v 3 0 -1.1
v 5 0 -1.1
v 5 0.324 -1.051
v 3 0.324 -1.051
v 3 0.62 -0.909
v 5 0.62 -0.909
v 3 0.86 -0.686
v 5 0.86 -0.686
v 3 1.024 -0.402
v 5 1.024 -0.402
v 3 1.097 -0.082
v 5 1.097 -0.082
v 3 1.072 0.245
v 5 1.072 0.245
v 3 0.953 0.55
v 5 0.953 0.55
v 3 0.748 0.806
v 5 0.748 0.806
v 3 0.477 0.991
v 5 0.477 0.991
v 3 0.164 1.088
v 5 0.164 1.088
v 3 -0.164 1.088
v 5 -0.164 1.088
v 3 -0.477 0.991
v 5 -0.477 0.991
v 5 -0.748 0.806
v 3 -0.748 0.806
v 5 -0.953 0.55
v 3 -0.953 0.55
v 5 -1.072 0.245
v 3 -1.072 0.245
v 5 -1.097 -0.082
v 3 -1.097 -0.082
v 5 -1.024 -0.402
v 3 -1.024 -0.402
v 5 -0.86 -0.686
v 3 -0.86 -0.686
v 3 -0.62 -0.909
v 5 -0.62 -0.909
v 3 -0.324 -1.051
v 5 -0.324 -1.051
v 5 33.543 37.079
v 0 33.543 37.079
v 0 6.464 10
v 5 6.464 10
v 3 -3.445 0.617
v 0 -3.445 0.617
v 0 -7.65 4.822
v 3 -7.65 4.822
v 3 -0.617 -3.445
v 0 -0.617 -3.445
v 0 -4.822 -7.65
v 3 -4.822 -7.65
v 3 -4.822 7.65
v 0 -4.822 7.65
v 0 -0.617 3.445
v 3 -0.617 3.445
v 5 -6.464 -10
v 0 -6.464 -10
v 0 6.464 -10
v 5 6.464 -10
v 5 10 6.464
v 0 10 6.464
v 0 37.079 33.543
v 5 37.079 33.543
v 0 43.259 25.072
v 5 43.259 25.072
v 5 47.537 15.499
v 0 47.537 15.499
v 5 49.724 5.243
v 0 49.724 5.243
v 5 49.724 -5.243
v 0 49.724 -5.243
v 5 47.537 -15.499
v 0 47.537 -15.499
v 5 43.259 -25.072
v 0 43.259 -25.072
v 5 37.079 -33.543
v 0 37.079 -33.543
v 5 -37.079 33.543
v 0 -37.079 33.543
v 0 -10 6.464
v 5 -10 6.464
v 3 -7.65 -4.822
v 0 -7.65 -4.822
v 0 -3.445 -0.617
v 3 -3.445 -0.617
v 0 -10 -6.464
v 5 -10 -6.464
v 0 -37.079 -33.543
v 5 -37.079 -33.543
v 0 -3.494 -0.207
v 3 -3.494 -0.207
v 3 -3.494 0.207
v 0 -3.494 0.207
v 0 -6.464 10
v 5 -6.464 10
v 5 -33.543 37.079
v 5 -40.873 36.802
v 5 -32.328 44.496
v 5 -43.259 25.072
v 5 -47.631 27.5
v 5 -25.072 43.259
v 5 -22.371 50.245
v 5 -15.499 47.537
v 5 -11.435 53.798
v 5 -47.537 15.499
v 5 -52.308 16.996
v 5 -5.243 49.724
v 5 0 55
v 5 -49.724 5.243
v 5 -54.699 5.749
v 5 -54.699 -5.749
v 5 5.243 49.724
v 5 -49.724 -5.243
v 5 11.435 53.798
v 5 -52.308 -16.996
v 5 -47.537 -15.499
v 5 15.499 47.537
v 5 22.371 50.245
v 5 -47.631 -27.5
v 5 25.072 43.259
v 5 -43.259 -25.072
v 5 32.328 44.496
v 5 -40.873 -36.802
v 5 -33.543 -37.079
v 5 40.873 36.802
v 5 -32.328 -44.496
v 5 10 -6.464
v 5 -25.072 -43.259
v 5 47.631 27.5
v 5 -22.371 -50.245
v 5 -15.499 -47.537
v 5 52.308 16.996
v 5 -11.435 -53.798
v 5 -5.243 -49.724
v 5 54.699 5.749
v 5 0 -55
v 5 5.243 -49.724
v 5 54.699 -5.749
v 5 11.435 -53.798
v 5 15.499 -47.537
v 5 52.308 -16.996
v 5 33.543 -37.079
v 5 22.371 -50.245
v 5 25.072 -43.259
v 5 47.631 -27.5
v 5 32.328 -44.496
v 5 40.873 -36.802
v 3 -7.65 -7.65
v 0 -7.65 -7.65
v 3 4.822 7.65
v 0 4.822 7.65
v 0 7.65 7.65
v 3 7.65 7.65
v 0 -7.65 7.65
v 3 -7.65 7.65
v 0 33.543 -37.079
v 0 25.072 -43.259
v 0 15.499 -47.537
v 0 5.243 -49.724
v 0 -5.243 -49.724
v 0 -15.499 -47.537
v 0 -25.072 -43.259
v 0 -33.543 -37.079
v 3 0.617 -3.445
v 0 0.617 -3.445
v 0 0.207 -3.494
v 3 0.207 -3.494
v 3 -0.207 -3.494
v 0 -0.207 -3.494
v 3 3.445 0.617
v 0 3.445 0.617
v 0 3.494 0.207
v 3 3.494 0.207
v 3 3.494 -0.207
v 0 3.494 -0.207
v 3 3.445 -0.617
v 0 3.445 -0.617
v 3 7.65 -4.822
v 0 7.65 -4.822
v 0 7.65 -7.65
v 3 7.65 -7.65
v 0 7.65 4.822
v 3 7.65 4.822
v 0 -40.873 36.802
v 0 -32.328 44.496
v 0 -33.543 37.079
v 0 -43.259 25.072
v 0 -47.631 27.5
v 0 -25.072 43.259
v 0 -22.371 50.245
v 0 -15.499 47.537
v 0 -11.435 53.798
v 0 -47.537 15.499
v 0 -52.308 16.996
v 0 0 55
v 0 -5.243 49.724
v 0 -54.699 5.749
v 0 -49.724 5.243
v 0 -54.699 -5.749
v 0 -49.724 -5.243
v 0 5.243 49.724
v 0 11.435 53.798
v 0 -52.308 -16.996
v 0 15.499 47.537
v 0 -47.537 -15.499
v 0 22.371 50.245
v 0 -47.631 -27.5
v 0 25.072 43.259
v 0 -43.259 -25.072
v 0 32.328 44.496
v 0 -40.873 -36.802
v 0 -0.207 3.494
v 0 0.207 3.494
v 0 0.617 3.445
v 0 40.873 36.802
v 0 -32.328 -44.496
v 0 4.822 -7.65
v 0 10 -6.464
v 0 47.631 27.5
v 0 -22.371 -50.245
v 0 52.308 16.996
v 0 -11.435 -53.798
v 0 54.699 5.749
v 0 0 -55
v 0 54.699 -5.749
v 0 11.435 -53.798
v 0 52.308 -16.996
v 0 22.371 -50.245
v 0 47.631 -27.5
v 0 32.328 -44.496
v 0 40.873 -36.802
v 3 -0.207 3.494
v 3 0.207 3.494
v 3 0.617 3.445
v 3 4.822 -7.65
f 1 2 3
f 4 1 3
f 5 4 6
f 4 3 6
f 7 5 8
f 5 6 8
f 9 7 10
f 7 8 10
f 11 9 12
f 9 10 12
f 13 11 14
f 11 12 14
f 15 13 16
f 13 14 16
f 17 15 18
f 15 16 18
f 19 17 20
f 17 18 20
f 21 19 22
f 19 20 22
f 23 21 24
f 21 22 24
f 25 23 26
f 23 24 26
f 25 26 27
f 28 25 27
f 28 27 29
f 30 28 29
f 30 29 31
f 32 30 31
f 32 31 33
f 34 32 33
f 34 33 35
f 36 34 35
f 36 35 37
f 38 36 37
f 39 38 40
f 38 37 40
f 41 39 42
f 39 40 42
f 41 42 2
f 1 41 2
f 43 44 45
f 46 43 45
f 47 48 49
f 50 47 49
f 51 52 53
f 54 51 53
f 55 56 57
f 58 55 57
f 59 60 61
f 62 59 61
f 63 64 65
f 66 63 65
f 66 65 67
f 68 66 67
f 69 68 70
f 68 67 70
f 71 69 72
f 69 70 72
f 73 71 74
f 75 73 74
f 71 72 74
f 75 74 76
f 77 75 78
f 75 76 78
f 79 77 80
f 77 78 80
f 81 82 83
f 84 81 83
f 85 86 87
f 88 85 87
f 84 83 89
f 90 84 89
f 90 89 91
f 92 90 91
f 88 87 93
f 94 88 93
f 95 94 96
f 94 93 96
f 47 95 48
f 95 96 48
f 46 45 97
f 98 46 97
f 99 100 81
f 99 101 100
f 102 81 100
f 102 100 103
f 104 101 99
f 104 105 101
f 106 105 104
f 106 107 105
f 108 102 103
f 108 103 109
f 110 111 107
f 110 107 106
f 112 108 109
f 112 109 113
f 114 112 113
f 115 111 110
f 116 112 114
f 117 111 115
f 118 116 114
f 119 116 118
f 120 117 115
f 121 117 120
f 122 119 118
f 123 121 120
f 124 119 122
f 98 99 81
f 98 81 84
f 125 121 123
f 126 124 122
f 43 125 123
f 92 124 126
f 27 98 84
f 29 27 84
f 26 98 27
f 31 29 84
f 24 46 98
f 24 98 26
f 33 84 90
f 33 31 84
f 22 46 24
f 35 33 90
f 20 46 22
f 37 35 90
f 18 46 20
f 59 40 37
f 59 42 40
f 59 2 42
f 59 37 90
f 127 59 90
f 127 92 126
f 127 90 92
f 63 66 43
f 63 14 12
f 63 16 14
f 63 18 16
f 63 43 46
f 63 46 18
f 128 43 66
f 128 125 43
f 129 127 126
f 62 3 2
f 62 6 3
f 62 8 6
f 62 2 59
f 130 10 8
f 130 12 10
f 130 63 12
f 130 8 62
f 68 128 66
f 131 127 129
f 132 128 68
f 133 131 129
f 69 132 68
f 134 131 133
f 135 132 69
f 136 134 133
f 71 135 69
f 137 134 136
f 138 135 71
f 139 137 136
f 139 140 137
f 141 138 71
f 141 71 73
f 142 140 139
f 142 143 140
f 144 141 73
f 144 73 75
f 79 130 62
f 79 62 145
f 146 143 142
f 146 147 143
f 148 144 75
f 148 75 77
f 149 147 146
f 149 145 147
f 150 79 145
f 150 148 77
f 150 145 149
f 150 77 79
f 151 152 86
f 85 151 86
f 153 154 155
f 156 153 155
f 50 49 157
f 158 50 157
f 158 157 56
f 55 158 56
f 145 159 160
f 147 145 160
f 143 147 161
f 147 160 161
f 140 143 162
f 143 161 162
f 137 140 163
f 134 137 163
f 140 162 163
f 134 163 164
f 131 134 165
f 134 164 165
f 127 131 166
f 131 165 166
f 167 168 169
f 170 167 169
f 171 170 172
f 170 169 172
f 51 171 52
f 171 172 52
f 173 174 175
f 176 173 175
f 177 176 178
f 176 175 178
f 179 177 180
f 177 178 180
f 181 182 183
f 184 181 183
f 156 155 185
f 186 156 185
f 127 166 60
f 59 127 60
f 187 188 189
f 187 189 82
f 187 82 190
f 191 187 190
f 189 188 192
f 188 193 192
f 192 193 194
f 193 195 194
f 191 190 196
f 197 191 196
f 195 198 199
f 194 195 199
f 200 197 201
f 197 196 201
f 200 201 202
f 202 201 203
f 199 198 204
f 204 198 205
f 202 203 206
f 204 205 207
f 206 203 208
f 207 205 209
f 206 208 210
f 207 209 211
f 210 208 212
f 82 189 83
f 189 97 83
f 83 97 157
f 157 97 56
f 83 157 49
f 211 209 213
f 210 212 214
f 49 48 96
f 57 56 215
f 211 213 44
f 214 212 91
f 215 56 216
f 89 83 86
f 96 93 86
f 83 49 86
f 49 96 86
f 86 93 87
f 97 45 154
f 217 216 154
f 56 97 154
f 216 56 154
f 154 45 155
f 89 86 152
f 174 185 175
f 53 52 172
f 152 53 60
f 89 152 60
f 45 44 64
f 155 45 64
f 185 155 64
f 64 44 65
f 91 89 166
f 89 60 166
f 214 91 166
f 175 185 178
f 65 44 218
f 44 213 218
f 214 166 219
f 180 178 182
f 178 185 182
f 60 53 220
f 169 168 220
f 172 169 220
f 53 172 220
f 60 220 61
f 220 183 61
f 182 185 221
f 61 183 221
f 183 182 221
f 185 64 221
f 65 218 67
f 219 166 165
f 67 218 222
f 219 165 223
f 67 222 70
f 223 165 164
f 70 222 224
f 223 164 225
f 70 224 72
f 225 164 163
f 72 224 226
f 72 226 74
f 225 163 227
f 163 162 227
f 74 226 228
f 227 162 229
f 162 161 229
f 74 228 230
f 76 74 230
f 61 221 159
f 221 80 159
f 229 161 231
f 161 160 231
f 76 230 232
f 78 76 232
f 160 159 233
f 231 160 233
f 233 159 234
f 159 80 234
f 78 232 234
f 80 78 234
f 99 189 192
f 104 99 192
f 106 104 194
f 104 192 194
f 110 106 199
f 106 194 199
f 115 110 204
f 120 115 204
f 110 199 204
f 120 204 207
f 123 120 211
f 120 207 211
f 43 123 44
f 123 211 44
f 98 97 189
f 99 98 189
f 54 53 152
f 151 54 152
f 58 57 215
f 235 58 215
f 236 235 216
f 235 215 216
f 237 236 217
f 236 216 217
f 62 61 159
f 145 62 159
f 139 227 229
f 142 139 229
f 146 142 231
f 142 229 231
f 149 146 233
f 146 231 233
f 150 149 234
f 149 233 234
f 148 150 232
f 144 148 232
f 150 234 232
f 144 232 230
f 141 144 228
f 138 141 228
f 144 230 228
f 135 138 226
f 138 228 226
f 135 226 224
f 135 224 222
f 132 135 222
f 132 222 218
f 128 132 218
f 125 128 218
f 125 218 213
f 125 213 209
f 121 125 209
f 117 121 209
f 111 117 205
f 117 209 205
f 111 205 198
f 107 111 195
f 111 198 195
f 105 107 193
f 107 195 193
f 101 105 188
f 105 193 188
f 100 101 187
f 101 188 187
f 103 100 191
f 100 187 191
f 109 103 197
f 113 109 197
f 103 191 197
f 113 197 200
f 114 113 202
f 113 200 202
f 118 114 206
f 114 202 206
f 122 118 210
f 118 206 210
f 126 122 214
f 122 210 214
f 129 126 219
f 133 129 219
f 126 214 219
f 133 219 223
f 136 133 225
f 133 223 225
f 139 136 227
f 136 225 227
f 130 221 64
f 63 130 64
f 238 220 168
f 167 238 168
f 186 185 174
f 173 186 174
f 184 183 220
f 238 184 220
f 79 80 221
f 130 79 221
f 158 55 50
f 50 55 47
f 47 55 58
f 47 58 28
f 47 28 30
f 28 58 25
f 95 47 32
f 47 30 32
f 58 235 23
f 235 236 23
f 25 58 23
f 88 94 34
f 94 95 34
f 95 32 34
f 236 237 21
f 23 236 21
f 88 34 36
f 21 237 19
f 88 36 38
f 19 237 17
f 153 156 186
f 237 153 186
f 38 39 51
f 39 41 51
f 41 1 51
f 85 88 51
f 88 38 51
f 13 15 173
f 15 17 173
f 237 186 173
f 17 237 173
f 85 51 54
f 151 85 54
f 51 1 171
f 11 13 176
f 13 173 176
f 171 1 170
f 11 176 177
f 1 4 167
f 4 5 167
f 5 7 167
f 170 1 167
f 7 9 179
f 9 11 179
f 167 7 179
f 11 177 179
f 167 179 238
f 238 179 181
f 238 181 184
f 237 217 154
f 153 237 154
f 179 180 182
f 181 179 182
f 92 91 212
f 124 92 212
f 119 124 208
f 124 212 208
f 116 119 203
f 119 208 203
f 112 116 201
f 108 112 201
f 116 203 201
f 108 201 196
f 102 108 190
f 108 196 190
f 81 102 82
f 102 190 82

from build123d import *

# Parameters (mm, degrees)
SKETCH1_R           = 55
BOSS_EXTRUDE1_DEPTH = 5
SKETCH2_W           = 15.3
SKETCH2_H           = 15.3
SKETCH2_R           = 1.1
BOSS_EXTRUDE2_DEPTH = 2


with BuildPart() as part:
    # Sketch1 → Boss-Extrude1 (new body)
    with BuildSketch(Plane(origin=(0, 0, 0), x_dir=(0, 0, -1), z_dir=(1, 0, 0))):
        Circle(SKETCH1_R)
        with BuildLine():
            Line((-33.543350277, -37.078884183), (-6.464466094, -10))
            Line((-6.464466094, -10), (6.464466094, -10))
            Line((6.464466094, -10), (33.543350277, -37.078884183))
            ThreePointArc((33.543350277, -37.078884183), (0, -50), (-33.543350277, -37.078884183))
        make_face(mode=Mode.SUBTRACT)
        with BuildLine():
            Line((10, -6.464466094), (10, 6.464466094))
            Line((10, 6.464466094), (37.078884183, 33.543350277))
            ThreePointArc((37.078884183, 33.543350277), (50, 0), (37.078884183, -33.543350277))
            Line((37.078884183, -33.543350277), (10, -6.464466094))
        make_face(mode=Mode.SUBTRACT)
        with BuildLine():
            Line((-37.078884183, 33.543350277), (-10, 6.464466094))
            Line((-10, 6.464466094), (-10, -6.464466094))
            Line((-10, -6.464466094), (-37.078884183, -33.543350277))
            ThreePointArc((-37.078884183, -33.543350277), (-50, 0), (-37.078884183, 33.543350277))
        make_face(mode=Mode.SUBTRACT)
        with BuildLine():
            Line((-0.616796039, -3.445223164), (-4.821572875, -7.65))
            Line((-4.821572875, -7.65), (-7.65, -7.65))
            Line((-7.65, -7.65), (-7.65, -4.821572875))
            Line((-7.65, -4.821572875), (-3.445223164, -0.616796039))
            ThreePointArc((-3.445223164, -0.616796039), (-3.5, 0), (-3.445223164, 0.616796039))
            Line((-3.445223164, 0.616796039), (-7.65, 4.821572875))
            Line((-7.65, 4.821572875), (-7.65, 7.65))
            Line((-7.65, 7.65), (-4.821572875, 7.65))
            Line((-4.821572875, 7.65), (-0.616796039, 3.445223164))
            ThreePointArc((-0.616796039, 3.445223164), (0, 3.5), (0.616796039, 3.445223164))
            Line((0.616796039, 3.445223164), (4.821572875, 7.65))
            Line((4.821572875, 7.65), (7.65, 7.65))
            Line((7.65, 7.65), (7.65, 4.821572875))
            Line((7.65, 4.821572875), (3.445223164, 0.616796039))
            ThreePointArc((3.445223164, 0.616796039), (3.5, 0), (3.445223164, -0.616796039))
            Line((3.445223164, -0.616796039), (7.65, -4.821572875))
            Line((7.65, -4.821572875), (7.65, -7.65))
            Line((7.65, -7.65), (4.821572875, -7.65))
            Line((4.821572875, -7.65), (0.616796039, -3.445223164))
            ThreePointArc((0.616796039, -3.445223164), (0, -3.5), (-0.616796039, -3.445223164))
        make_face(mode=Mode.SUBTRACT)
        with BuildLine():
            Line((6.464466094, 10), (-6.464466094, 10))
            Line((-6.464466094, 10), (-33.543350277, 37.078884183))
            ThreePointArc((-33.543350277, 37.078884183), (0, 50), (33.543350277, 37.078884183))
            Line((33.543350277, 37.078884183), (6.464466094, 10))
        make_face(mode=Mode.SUBTRACT)
    extrude(amount=BOSS_EXTRUDE1_DEPTH)

    # Sketch2 → Boss-Extrude2 (add)
    with BuildSketch(Plane(origin=(5, 0, 0), x_dir=(0, 0, -1), z_dir=(1, 0, 0))):
        Rectangle(SKETCH2_W, SKETCH2_H)
        Circle(SKETCH2_R, mode=Mode.SUBTRACT)
    extrude(amount=-BOSS_EXTRUDE2_DEPTH)


solid = part.part
